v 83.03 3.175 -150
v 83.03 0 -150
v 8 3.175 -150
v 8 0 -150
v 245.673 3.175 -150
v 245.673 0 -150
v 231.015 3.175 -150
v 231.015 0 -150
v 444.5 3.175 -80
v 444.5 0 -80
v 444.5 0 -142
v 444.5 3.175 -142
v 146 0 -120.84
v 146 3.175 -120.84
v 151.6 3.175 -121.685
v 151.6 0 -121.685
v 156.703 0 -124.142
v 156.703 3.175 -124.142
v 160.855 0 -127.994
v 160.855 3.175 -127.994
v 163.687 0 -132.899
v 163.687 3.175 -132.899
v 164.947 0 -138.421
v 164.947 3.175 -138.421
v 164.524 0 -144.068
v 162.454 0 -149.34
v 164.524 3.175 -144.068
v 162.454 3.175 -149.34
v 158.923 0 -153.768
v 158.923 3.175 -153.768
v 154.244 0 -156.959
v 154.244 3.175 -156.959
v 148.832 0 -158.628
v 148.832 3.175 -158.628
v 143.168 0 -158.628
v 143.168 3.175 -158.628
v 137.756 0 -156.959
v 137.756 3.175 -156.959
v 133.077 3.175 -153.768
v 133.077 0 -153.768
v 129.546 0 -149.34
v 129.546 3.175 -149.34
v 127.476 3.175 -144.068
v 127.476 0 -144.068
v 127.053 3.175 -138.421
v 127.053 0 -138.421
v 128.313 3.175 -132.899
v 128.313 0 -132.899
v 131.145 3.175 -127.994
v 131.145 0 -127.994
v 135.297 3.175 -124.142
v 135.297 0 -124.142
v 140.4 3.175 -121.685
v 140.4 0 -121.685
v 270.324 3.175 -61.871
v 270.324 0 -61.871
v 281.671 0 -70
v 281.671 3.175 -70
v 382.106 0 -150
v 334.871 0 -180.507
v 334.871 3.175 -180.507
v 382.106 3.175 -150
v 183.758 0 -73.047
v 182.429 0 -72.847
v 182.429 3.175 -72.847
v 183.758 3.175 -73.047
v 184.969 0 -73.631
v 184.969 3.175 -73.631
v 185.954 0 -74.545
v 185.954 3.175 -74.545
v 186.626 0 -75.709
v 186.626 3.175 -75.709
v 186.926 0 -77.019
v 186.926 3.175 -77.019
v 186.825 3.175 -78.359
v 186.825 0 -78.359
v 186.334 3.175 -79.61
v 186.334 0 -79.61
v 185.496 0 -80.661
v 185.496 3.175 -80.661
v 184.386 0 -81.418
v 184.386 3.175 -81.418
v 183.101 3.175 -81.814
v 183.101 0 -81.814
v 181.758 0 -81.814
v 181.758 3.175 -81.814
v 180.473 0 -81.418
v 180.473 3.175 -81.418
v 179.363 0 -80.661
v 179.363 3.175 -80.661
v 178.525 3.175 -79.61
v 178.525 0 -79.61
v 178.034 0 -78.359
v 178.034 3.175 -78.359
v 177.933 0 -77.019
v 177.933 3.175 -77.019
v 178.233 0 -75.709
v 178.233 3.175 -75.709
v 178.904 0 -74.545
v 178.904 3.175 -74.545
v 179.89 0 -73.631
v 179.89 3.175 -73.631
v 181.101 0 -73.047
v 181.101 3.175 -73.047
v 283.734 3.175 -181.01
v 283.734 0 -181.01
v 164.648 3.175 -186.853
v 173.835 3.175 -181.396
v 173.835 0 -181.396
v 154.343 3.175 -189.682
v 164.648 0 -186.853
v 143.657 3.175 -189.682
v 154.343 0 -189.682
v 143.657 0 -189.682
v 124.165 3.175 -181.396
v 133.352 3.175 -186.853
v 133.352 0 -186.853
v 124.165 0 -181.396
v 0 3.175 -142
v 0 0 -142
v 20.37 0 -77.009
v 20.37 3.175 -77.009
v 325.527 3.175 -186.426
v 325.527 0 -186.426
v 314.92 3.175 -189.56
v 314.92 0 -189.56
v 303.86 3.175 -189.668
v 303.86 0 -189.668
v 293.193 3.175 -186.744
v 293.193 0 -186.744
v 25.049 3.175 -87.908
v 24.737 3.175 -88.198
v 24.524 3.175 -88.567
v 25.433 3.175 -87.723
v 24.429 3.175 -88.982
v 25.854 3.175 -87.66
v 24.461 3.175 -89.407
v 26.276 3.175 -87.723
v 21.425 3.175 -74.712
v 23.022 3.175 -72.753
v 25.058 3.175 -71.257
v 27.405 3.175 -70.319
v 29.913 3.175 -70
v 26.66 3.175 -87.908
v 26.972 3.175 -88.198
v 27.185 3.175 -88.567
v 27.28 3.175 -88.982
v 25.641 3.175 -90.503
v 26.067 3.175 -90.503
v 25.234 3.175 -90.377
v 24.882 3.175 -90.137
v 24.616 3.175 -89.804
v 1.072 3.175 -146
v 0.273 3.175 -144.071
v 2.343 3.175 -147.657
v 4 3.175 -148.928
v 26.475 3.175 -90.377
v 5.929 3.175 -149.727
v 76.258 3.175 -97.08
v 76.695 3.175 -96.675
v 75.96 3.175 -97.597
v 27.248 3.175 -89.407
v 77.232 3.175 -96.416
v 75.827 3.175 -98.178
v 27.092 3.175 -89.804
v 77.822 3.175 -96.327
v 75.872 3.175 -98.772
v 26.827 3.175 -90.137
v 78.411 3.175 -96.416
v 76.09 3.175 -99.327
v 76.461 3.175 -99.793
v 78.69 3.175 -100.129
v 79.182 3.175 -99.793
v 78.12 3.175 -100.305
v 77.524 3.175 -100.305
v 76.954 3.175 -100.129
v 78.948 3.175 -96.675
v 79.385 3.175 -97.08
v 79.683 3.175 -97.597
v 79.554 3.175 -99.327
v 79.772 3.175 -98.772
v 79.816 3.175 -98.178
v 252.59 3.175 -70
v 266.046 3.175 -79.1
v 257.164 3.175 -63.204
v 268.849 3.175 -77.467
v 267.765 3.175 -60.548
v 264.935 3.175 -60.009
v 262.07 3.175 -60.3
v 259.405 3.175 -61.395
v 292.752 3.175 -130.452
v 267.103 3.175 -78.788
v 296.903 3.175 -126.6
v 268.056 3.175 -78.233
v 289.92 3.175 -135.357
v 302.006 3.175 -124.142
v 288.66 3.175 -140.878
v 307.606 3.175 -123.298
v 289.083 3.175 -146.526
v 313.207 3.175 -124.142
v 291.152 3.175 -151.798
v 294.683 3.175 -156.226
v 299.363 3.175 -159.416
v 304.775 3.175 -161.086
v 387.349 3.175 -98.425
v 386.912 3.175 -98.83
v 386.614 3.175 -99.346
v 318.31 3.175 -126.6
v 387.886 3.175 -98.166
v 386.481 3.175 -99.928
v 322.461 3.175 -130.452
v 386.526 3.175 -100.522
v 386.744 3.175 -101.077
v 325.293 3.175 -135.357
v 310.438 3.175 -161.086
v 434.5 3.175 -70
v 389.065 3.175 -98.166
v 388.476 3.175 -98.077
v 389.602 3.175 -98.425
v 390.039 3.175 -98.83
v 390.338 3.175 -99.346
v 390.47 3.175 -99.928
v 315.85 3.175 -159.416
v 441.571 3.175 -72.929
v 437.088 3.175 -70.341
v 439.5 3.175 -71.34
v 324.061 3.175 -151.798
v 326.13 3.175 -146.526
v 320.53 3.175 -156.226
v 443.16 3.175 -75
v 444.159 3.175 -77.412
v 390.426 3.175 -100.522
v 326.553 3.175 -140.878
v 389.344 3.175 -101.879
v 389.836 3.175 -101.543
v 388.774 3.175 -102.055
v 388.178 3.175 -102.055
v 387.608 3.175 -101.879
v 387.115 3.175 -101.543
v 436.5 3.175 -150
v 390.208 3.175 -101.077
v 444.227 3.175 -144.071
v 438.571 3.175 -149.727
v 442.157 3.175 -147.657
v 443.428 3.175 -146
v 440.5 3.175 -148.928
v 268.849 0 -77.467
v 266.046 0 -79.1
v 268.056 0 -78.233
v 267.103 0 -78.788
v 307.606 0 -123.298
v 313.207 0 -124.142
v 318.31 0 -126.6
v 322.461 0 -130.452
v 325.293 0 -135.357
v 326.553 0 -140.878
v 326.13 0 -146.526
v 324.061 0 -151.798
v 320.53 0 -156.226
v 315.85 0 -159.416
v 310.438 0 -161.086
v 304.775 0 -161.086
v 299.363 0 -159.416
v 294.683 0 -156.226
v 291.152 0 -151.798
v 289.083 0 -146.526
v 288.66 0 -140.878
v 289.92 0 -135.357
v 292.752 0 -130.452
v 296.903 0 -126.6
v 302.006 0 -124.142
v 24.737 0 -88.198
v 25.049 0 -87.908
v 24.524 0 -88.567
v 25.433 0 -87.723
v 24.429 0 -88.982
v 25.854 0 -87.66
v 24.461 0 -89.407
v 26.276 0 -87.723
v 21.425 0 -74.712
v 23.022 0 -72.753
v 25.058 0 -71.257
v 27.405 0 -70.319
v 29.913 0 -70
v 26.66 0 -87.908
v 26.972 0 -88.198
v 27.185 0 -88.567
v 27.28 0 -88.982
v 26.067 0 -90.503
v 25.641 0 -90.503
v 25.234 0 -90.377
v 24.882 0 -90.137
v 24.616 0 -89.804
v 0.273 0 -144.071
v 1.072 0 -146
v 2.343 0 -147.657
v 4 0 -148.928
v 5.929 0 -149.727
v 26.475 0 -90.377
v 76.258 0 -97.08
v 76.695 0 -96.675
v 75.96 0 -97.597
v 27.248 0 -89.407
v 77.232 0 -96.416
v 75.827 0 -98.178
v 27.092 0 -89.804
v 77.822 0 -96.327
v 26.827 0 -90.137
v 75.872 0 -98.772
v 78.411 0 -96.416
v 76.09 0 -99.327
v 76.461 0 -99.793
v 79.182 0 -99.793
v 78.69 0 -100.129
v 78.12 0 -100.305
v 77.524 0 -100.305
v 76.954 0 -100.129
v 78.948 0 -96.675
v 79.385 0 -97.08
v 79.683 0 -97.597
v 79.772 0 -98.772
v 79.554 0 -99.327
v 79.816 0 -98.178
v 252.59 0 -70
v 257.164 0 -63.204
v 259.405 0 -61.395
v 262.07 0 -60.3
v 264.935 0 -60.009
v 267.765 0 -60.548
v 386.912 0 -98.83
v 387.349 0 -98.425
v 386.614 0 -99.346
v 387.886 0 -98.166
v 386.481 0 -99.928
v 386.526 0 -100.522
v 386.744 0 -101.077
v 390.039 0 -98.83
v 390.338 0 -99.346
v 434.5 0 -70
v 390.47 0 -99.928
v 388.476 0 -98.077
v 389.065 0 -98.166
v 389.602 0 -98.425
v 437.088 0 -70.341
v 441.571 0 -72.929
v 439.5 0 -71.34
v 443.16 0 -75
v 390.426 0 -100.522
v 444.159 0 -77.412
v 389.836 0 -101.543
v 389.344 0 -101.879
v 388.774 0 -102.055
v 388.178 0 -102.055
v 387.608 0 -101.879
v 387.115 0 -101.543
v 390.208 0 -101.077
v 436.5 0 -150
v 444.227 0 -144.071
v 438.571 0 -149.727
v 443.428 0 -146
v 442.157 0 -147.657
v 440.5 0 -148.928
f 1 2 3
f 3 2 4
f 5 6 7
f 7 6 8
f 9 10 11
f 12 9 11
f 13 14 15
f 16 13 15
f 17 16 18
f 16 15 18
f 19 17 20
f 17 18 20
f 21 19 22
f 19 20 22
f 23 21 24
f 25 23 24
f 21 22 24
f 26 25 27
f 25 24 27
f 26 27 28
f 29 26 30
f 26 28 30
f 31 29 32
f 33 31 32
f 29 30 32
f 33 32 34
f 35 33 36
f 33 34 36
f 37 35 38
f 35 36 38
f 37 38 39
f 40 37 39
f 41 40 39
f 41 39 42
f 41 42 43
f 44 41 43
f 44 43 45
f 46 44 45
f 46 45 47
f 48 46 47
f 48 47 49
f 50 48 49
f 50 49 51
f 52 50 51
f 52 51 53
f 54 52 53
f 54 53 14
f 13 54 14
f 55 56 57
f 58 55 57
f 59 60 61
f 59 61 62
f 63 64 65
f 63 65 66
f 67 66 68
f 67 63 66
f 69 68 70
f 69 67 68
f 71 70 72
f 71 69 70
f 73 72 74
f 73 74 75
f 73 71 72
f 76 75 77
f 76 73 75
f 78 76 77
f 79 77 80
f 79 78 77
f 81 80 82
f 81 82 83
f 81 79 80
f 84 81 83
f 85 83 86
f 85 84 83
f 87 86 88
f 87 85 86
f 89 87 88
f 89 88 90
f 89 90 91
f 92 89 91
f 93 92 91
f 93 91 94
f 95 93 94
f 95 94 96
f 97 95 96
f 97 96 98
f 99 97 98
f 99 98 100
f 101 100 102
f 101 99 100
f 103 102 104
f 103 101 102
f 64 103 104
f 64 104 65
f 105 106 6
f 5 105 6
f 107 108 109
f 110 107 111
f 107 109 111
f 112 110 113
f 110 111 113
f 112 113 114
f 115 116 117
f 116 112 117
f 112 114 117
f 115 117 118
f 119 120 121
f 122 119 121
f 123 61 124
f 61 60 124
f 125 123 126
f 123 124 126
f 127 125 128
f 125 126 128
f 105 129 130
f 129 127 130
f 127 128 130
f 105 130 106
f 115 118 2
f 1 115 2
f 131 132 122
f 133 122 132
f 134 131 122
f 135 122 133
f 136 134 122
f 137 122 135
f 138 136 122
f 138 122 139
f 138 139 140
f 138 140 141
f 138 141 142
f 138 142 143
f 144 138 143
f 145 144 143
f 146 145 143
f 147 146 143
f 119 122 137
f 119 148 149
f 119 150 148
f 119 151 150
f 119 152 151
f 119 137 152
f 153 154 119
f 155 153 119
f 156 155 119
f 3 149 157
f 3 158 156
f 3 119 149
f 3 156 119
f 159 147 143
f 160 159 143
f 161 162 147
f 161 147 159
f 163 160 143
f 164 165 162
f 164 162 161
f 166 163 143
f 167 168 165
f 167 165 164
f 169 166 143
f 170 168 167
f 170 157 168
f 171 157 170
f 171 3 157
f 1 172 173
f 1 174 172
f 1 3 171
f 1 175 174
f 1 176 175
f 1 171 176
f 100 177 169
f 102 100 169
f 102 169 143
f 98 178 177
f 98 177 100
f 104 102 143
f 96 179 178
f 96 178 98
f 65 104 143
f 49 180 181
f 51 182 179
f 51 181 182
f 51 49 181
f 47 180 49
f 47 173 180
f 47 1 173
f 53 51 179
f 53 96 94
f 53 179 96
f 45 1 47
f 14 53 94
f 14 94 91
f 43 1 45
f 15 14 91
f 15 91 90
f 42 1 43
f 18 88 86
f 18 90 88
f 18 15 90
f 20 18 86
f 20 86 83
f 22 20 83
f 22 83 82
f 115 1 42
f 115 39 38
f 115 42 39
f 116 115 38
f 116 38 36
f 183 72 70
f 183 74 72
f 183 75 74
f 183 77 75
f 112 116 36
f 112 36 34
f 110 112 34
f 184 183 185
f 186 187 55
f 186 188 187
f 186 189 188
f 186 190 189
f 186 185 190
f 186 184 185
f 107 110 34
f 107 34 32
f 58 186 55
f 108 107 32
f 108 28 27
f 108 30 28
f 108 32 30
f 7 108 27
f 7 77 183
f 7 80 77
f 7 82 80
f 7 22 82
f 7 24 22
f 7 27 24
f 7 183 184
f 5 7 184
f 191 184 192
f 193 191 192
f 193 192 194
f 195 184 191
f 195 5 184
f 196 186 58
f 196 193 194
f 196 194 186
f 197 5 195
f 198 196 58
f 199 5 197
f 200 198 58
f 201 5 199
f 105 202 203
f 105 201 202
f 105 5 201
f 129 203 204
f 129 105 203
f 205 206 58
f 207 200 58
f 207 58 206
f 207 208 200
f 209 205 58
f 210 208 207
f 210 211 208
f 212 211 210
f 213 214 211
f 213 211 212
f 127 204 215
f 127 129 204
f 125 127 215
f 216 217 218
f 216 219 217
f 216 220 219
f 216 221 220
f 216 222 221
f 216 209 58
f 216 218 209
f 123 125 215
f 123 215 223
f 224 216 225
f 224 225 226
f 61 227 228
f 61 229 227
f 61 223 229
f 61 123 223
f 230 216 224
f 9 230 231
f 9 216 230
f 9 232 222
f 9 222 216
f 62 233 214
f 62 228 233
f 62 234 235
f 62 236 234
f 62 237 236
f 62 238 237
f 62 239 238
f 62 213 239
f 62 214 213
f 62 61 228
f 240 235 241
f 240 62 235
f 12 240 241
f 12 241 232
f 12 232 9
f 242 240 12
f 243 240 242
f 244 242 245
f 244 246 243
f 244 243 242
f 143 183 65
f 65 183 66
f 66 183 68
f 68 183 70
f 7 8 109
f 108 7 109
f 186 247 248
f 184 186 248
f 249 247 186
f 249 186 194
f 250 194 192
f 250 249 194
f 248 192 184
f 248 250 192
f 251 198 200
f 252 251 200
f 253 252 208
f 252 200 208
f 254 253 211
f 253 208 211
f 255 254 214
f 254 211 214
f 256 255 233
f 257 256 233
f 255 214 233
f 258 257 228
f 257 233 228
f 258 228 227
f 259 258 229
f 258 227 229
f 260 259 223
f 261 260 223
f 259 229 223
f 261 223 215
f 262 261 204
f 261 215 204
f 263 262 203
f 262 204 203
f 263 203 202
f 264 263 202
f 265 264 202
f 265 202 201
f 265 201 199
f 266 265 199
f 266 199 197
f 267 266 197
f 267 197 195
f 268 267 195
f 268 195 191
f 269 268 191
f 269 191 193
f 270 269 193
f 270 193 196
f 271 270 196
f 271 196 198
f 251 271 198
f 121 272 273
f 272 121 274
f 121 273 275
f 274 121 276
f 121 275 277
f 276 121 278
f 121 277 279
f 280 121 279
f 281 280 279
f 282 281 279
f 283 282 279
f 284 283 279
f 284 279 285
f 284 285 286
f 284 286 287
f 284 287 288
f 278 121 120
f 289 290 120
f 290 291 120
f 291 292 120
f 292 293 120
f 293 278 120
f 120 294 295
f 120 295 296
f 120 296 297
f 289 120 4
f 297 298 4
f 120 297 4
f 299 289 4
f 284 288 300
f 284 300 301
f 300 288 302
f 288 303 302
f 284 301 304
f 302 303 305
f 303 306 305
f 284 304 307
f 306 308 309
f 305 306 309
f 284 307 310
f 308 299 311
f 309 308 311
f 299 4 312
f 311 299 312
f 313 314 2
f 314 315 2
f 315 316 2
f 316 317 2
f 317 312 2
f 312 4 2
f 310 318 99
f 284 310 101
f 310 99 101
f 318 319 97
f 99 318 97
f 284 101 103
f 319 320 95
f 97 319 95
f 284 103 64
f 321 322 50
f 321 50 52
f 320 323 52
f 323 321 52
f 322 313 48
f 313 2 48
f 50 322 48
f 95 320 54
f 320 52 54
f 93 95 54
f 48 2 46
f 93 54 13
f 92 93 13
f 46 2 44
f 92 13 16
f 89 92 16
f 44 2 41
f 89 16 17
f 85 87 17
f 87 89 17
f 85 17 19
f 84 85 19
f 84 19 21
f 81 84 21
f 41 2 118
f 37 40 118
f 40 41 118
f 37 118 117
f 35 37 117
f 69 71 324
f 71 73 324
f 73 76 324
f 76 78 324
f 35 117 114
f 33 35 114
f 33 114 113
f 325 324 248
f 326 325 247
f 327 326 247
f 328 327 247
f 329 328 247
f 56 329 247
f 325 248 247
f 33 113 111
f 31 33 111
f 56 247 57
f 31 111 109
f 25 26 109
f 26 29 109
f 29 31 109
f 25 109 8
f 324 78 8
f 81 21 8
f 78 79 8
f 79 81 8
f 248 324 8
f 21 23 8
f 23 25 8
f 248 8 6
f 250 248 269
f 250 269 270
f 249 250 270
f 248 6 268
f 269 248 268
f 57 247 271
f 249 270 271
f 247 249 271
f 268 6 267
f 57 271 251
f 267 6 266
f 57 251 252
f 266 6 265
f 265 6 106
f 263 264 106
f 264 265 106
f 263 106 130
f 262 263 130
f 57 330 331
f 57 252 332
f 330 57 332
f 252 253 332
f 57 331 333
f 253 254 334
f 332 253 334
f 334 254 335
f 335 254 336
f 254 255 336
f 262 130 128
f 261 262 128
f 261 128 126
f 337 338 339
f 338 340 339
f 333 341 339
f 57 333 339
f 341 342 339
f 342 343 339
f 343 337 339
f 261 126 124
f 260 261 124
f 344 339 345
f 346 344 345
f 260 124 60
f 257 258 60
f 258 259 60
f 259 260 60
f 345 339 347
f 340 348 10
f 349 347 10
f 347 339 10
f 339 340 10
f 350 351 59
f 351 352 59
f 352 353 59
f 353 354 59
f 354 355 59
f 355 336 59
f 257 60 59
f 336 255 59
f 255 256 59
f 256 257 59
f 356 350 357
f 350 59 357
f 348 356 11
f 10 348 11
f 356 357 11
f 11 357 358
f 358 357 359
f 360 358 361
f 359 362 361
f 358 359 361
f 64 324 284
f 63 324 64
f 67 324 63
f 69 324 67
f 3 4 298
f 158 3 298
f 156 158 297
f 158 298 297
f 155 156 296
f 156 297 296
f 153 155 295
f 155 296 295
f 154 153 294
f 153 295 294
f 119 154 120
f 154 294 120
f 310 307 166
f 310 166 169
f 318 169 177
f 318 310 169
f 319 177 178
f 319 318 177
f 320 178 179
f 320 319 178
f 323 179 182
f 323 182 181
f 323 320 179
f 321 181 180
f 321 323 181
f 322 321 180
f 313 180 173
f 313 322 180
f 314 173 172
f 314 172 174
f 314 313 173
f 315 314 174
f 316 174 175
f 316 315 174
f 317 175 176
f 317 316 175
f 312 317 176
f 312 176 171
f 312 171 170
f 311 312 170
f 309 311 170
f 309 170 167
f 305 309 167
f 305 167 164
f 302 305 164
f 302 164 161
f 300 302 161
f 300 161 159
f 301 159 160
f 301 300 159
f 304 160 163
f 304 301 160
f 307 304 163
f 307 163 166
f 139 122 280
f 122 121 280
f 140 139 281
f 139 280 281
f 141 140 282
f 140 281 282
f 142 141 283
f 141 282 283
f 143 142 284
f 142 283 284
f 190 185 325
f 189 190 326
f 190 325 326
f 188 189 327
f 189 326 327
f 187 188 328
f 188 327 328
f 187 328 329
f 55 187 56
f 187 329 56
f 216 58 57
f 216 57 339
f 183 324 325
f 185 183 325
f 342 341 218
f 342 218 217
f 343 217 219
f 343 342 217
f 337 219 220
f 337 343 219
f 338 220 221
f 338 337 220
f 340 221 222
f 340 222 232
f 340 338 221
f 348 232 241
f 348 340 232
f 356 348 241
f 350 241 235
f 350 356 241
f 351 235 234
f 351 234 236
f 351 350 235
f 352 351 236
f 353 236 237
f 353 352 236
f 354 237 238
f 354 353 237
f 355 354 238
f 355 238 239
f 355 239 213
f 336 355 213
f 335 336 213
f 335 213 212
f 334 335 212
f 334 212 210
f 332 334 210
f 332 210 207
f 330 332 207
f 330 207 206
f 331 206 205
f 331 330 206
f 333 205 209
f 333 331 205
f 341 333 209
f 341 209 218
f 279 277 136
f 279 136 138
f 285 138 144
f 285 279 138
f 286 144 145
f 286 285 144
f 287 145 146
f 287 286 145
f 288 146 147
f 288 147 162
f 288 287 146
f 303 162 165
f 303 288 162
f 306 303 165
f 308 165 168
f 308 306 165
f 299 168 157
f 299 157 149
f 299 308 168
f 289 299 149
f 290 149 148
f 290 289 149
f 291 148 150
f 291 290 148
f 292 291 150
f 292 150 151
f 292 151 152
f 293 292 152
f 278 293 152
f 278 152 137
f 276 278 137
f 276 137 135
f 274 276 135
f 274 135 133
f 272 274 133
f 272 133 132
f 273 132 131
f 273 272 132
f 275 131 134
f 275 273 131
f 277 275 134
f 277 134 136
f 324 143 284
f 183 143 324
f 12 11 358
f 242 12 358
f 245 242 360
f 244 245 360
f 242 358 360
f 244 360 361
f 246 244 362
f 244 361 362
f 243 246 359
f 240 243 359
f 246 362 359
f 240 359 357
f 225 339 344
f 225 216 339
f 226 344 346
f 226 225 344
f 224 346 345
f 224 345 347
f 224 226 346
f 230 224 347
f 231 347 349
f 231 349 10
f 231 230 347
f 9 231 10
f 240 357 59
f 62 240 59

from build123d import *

# Parameters (mm, degrees)
SKETCH1_R                = 4.50864138
SKETCH1_R_2              = 2
SKETCH1_R_3              = 4.6
SKETCH1_R_4              = 1.429414062
BOSS_EXTRUDE1_DEPTH      = 3.175
SKETCH2_W                = 597.466303312
SKETCH2_H                = 60.972543052
CUT_EXTRUDE1_DEPTH       = 70
FILLET1_R                = 10
FILLET2_R                = 10
SKETCH6_R                = 40
BOSS_EXTRUDE2_DEPTH      = 3.175
BOSS_EXTRUDE3_DEPTH      = 3.175
SKETCH9_R                = 40
BOSS_EXTRUDE4_DEPTH      = 3.175
BOSS_EXTRUDE6_DEPTH      = 3.175
SKETCH13_R               = 19
CUT_EXTRUDE5_DEPTH       = 10
SKETCH14_R               = 19
CUT_EXTRUDE6_DEPTH       = 10
BOSS_EXTRUDE7_DEPTH      = 10
BOSS_EXTRUDE7_DEPTH_BACK = 3.175
SKETCH16_W               = 39.380598922
SKETCH16_H               = 33.904845405
CUT_EXTRUDE7_DEPTH       = 10


with BuildPart() as part:
    # Sketch1 → Boss-Extrude1 (new body)
    with BuildSketch(Plane(origin=(0, 0, 0), x_dir=(1, 0, 0), z_dir=(0, 1, 0))):
        with BuildLine():
            ThreePointArc((8, 150), (2.343145751, 147.656854249), (0, 142))
            Line((0, 142), (42, 8))
            ThreePointArc((42, 8), (44.343145751, 2.343145751), (50, 0))
            Line((50, 0), (436.5, 0))
            ThreePointArc((436.5, 0), (442.156854249, 2.343145751), (444.5, 8))
            Line((444.5, 8), (444.5, 142))
            ThreePointArc((444.5, 142), (442.156854249, 147.656854249), (436.5, 150))
            Line((436.5, 150), (338.059360585, 150))
            ThreePointArc((338.059360585, 150), (334.223325972, 144.782574379), (330.387291359, 150))
            Line((330.387291359, 150), (282.940349401, 150))
            ThreePointArc((282.940349401, 150), (281.106475607, 148.798064477), (279.272601814, 150))
            Line((279.272601814, 150), (172.868406334, 150))
            ThreePointArc((172.868406334, 150), (172.5, 146.64039861), (172.131593666, 150))
            Line((172.131593666, 150), (123.116119719, 150))
            ThreePointArc((123.116119719, 150), (122, 146.34039861), (120.883880281, 150))
            Line((120.883880281, 150), (8, 150))
        make_face()
        with Locations(Location((182.429479385, 77.355745695, 0), (0, 0, 270))):
            Circle(SKETCH1_R, mode=Mode.SUBTRACT)
        with Locations(Location((388.475756445, 100.077126905, 0), (0, 0, 270))):
            Circle(SKETCH1_R_2, mode=Mode.SUBTRACT)
        with Locations(Location((265.281257274, 74.563866981, 0), (0, 0, 270))):
            Circle(SKETCH1_R_3, mode=Mode.SUBTRACT)
        with Locations(Location((25.854352659, 89.089252974, 0), (0, 0, 270))):
            Circle(SKETCH1_R_4, mode=Mode.SUBTRACT)
        with Locations(Location((77.821750814, 98.327219393, 0), (0, 0, 270))):
            Circle(SKETCH1_R_2, mode=Mode.SUBTRACT)
    extrude(amount=BOSS_EXTRUDE1_DEPTH)

    # Sketch2 → Cut-Extrude1 (cut)
    with BuildSketch(Plane.XY):
        with Locations((220.1785332, 7.544358636)):
            Rectangle(SKETCH2_W, SKETCH2_H)
    extrude(amount=-CUT_EXTRUDE1_DEPTH, mode=Mode.SUBTRACT)

    # Fillet1
    fillet1_edges = [part.edges().sort_by_distance(p)[0] for p in [
        (22.567164179, 1.5875, -70),
    ]]
    fillet(fillet1_edges, radius=FILLET1_R)

    # Fillet2
    fillet2_edges = [part.edges().sort_by_distance(p)[0] for p in [
        (444.5, 1.5875, -70),
    ]]
    fillet(fillet2_edges, radius=FILLET2_R)

    # Sketch6 → Boss-Extrude2 (add)
    with BuildSketch(Plane(origin=(0, 0, 0), x_dir=(1, 0, 0), z_dir=(0, 1, 0))):
        with Locations((149, 150.04039861)):
            Circle(SKETCH6_R)
    extrude(amount=BOSS_EXTRUDE2_DEPTH)

    # Sketch7 → Boss-Extrude3 (add)
    with BuildSketch(Plane(origin=(0, 0, 0), x_dir=(1, 0, 0), z_dir=(0, 1, 0))):
        Polygon((124.164543783, 181.396420591), (82.702881078, 149.750534228), (231.468946681, 149.750534228), (173.835456217, 181.396420591), align=None)
    extrude(amount=BOSS_EXTRUDE3_DEPTH)

    # Sketch9 → Boss-Extrude4 (add)
    with BuildSketch(Plane(origin=(0, 0, 0), x_dir=(1, 0, 0), z_dir=(0, 1, 0))):
        with BuildLine():
            ThreePointArc((269, 150), (272.870833001, 167.166341835), (283.734164599, 181.010281545))
            Line((283.734164599, 181.010281545), (245.673378314, 150))
            Line((245.673378314, 150), (269, 150))
        make_face()
        with Locations((309, 150)):
            Circle(SKETCH9_R)
    extrude(amount=BOSS_EXTRUDE4_DEPTH)

    # Sketch12 → Boss-Extrude6 (add)
    with BuildSketch(Plane(origin=(0, 0, 0), x_dir=(1, 0, 0), z_dir=(0, 1, 0))):
        Polygon((326.166341835, 186.129166999), (382.106475607, 150), (340.398839744, 150), align=None)
    extrude(amount=BOSS_EXTRUDE6_DEPTH)

    # Sketch13 → Cut-Extrude5 (cut)
    with BuildSketch(Plane(origin=(0, 3.175, 0), x_dir=(1, 0, 0), z_dir=(0, 1, 0))):
        with Locations(Location((146, 139.84039861, 0), (0, 0, 270))):
            Circle(SKETCH13_R)
    extrude(amount=-CUT_EXTRUDE5_DEPTH, mode=Mode.SUBTRACT)

    # Sketch14 → Cut-Extrude6 (cut)
    with BuildSketch(Plane(origin=(0, 3.175, 0), x_dir=(1, 0, 0), z_dir=(0, 1, 0))):
        with Locations(Location((307.606475607, 142.298064477, 0), (0, 0, 270))):
            Circle(SKETCH14_R)
    extrude(amount=-CUT_EXTRUDE6_DEPTH, mode=Mode.SUBTRACT)

    # Sketch15 → Boss-Extrude7 (add, two sides: drawn at the far end of the back side and taken through both)
    with BuildSketch(Plane(origin=(0, 3.175, 0), x_dir=(1, 0, 0), z_dir=(0, 1, 0)).offset(-BOSS_EXTRUDE7_DEPTH_BACK)):
        with BuildLine():
            Line((270.323640372, 61.870718801), (281.671389991, 70))
            Line((281.671389991, 70), (265.856685963, 70))
            ThreePointArc((265.856685963, 70), (269.551101507, 72.852601302), (268.849345077, 77.467097842))
            Line((268.849345077, 77.467097842), (266.045546336, 79.099929396))
            ThreePointArc((266.045546336, 79.099929396), (260.730312777, 75.233870106), (264.705828584, 70))
            Line((264.705828584, 70), (252.589726142, 70))
            Line((252.589726142, 70), (257.164027826, 63.204154779))
            ThreePointArc((257.164027826, 63.204154779), (263.491883069, 60.050944756), (270.323640372, 61.870718801))
        make_face()
    extrude(amount=BOSS_EXTRUDE7_DEPTH + BOSS_EXTRUDE7_DEPTH_BACK)

    # Sketch16 → Cut-Extrude7 (cut)
    with BuildSketch(Plane(origin=(0, 13.175, 0), x_dir=(1, 0, 0), z_dir=(0, 1, 0))):
        with Locations((267.135263248, 68.050551455)):
            Rectangle(SKETCH16_W, SKETCH16_H)
    extrude(amount=-CUT_EXTRUDE7_DEPTH, mode=Mode.SUBTRACT)


solid = part.part
